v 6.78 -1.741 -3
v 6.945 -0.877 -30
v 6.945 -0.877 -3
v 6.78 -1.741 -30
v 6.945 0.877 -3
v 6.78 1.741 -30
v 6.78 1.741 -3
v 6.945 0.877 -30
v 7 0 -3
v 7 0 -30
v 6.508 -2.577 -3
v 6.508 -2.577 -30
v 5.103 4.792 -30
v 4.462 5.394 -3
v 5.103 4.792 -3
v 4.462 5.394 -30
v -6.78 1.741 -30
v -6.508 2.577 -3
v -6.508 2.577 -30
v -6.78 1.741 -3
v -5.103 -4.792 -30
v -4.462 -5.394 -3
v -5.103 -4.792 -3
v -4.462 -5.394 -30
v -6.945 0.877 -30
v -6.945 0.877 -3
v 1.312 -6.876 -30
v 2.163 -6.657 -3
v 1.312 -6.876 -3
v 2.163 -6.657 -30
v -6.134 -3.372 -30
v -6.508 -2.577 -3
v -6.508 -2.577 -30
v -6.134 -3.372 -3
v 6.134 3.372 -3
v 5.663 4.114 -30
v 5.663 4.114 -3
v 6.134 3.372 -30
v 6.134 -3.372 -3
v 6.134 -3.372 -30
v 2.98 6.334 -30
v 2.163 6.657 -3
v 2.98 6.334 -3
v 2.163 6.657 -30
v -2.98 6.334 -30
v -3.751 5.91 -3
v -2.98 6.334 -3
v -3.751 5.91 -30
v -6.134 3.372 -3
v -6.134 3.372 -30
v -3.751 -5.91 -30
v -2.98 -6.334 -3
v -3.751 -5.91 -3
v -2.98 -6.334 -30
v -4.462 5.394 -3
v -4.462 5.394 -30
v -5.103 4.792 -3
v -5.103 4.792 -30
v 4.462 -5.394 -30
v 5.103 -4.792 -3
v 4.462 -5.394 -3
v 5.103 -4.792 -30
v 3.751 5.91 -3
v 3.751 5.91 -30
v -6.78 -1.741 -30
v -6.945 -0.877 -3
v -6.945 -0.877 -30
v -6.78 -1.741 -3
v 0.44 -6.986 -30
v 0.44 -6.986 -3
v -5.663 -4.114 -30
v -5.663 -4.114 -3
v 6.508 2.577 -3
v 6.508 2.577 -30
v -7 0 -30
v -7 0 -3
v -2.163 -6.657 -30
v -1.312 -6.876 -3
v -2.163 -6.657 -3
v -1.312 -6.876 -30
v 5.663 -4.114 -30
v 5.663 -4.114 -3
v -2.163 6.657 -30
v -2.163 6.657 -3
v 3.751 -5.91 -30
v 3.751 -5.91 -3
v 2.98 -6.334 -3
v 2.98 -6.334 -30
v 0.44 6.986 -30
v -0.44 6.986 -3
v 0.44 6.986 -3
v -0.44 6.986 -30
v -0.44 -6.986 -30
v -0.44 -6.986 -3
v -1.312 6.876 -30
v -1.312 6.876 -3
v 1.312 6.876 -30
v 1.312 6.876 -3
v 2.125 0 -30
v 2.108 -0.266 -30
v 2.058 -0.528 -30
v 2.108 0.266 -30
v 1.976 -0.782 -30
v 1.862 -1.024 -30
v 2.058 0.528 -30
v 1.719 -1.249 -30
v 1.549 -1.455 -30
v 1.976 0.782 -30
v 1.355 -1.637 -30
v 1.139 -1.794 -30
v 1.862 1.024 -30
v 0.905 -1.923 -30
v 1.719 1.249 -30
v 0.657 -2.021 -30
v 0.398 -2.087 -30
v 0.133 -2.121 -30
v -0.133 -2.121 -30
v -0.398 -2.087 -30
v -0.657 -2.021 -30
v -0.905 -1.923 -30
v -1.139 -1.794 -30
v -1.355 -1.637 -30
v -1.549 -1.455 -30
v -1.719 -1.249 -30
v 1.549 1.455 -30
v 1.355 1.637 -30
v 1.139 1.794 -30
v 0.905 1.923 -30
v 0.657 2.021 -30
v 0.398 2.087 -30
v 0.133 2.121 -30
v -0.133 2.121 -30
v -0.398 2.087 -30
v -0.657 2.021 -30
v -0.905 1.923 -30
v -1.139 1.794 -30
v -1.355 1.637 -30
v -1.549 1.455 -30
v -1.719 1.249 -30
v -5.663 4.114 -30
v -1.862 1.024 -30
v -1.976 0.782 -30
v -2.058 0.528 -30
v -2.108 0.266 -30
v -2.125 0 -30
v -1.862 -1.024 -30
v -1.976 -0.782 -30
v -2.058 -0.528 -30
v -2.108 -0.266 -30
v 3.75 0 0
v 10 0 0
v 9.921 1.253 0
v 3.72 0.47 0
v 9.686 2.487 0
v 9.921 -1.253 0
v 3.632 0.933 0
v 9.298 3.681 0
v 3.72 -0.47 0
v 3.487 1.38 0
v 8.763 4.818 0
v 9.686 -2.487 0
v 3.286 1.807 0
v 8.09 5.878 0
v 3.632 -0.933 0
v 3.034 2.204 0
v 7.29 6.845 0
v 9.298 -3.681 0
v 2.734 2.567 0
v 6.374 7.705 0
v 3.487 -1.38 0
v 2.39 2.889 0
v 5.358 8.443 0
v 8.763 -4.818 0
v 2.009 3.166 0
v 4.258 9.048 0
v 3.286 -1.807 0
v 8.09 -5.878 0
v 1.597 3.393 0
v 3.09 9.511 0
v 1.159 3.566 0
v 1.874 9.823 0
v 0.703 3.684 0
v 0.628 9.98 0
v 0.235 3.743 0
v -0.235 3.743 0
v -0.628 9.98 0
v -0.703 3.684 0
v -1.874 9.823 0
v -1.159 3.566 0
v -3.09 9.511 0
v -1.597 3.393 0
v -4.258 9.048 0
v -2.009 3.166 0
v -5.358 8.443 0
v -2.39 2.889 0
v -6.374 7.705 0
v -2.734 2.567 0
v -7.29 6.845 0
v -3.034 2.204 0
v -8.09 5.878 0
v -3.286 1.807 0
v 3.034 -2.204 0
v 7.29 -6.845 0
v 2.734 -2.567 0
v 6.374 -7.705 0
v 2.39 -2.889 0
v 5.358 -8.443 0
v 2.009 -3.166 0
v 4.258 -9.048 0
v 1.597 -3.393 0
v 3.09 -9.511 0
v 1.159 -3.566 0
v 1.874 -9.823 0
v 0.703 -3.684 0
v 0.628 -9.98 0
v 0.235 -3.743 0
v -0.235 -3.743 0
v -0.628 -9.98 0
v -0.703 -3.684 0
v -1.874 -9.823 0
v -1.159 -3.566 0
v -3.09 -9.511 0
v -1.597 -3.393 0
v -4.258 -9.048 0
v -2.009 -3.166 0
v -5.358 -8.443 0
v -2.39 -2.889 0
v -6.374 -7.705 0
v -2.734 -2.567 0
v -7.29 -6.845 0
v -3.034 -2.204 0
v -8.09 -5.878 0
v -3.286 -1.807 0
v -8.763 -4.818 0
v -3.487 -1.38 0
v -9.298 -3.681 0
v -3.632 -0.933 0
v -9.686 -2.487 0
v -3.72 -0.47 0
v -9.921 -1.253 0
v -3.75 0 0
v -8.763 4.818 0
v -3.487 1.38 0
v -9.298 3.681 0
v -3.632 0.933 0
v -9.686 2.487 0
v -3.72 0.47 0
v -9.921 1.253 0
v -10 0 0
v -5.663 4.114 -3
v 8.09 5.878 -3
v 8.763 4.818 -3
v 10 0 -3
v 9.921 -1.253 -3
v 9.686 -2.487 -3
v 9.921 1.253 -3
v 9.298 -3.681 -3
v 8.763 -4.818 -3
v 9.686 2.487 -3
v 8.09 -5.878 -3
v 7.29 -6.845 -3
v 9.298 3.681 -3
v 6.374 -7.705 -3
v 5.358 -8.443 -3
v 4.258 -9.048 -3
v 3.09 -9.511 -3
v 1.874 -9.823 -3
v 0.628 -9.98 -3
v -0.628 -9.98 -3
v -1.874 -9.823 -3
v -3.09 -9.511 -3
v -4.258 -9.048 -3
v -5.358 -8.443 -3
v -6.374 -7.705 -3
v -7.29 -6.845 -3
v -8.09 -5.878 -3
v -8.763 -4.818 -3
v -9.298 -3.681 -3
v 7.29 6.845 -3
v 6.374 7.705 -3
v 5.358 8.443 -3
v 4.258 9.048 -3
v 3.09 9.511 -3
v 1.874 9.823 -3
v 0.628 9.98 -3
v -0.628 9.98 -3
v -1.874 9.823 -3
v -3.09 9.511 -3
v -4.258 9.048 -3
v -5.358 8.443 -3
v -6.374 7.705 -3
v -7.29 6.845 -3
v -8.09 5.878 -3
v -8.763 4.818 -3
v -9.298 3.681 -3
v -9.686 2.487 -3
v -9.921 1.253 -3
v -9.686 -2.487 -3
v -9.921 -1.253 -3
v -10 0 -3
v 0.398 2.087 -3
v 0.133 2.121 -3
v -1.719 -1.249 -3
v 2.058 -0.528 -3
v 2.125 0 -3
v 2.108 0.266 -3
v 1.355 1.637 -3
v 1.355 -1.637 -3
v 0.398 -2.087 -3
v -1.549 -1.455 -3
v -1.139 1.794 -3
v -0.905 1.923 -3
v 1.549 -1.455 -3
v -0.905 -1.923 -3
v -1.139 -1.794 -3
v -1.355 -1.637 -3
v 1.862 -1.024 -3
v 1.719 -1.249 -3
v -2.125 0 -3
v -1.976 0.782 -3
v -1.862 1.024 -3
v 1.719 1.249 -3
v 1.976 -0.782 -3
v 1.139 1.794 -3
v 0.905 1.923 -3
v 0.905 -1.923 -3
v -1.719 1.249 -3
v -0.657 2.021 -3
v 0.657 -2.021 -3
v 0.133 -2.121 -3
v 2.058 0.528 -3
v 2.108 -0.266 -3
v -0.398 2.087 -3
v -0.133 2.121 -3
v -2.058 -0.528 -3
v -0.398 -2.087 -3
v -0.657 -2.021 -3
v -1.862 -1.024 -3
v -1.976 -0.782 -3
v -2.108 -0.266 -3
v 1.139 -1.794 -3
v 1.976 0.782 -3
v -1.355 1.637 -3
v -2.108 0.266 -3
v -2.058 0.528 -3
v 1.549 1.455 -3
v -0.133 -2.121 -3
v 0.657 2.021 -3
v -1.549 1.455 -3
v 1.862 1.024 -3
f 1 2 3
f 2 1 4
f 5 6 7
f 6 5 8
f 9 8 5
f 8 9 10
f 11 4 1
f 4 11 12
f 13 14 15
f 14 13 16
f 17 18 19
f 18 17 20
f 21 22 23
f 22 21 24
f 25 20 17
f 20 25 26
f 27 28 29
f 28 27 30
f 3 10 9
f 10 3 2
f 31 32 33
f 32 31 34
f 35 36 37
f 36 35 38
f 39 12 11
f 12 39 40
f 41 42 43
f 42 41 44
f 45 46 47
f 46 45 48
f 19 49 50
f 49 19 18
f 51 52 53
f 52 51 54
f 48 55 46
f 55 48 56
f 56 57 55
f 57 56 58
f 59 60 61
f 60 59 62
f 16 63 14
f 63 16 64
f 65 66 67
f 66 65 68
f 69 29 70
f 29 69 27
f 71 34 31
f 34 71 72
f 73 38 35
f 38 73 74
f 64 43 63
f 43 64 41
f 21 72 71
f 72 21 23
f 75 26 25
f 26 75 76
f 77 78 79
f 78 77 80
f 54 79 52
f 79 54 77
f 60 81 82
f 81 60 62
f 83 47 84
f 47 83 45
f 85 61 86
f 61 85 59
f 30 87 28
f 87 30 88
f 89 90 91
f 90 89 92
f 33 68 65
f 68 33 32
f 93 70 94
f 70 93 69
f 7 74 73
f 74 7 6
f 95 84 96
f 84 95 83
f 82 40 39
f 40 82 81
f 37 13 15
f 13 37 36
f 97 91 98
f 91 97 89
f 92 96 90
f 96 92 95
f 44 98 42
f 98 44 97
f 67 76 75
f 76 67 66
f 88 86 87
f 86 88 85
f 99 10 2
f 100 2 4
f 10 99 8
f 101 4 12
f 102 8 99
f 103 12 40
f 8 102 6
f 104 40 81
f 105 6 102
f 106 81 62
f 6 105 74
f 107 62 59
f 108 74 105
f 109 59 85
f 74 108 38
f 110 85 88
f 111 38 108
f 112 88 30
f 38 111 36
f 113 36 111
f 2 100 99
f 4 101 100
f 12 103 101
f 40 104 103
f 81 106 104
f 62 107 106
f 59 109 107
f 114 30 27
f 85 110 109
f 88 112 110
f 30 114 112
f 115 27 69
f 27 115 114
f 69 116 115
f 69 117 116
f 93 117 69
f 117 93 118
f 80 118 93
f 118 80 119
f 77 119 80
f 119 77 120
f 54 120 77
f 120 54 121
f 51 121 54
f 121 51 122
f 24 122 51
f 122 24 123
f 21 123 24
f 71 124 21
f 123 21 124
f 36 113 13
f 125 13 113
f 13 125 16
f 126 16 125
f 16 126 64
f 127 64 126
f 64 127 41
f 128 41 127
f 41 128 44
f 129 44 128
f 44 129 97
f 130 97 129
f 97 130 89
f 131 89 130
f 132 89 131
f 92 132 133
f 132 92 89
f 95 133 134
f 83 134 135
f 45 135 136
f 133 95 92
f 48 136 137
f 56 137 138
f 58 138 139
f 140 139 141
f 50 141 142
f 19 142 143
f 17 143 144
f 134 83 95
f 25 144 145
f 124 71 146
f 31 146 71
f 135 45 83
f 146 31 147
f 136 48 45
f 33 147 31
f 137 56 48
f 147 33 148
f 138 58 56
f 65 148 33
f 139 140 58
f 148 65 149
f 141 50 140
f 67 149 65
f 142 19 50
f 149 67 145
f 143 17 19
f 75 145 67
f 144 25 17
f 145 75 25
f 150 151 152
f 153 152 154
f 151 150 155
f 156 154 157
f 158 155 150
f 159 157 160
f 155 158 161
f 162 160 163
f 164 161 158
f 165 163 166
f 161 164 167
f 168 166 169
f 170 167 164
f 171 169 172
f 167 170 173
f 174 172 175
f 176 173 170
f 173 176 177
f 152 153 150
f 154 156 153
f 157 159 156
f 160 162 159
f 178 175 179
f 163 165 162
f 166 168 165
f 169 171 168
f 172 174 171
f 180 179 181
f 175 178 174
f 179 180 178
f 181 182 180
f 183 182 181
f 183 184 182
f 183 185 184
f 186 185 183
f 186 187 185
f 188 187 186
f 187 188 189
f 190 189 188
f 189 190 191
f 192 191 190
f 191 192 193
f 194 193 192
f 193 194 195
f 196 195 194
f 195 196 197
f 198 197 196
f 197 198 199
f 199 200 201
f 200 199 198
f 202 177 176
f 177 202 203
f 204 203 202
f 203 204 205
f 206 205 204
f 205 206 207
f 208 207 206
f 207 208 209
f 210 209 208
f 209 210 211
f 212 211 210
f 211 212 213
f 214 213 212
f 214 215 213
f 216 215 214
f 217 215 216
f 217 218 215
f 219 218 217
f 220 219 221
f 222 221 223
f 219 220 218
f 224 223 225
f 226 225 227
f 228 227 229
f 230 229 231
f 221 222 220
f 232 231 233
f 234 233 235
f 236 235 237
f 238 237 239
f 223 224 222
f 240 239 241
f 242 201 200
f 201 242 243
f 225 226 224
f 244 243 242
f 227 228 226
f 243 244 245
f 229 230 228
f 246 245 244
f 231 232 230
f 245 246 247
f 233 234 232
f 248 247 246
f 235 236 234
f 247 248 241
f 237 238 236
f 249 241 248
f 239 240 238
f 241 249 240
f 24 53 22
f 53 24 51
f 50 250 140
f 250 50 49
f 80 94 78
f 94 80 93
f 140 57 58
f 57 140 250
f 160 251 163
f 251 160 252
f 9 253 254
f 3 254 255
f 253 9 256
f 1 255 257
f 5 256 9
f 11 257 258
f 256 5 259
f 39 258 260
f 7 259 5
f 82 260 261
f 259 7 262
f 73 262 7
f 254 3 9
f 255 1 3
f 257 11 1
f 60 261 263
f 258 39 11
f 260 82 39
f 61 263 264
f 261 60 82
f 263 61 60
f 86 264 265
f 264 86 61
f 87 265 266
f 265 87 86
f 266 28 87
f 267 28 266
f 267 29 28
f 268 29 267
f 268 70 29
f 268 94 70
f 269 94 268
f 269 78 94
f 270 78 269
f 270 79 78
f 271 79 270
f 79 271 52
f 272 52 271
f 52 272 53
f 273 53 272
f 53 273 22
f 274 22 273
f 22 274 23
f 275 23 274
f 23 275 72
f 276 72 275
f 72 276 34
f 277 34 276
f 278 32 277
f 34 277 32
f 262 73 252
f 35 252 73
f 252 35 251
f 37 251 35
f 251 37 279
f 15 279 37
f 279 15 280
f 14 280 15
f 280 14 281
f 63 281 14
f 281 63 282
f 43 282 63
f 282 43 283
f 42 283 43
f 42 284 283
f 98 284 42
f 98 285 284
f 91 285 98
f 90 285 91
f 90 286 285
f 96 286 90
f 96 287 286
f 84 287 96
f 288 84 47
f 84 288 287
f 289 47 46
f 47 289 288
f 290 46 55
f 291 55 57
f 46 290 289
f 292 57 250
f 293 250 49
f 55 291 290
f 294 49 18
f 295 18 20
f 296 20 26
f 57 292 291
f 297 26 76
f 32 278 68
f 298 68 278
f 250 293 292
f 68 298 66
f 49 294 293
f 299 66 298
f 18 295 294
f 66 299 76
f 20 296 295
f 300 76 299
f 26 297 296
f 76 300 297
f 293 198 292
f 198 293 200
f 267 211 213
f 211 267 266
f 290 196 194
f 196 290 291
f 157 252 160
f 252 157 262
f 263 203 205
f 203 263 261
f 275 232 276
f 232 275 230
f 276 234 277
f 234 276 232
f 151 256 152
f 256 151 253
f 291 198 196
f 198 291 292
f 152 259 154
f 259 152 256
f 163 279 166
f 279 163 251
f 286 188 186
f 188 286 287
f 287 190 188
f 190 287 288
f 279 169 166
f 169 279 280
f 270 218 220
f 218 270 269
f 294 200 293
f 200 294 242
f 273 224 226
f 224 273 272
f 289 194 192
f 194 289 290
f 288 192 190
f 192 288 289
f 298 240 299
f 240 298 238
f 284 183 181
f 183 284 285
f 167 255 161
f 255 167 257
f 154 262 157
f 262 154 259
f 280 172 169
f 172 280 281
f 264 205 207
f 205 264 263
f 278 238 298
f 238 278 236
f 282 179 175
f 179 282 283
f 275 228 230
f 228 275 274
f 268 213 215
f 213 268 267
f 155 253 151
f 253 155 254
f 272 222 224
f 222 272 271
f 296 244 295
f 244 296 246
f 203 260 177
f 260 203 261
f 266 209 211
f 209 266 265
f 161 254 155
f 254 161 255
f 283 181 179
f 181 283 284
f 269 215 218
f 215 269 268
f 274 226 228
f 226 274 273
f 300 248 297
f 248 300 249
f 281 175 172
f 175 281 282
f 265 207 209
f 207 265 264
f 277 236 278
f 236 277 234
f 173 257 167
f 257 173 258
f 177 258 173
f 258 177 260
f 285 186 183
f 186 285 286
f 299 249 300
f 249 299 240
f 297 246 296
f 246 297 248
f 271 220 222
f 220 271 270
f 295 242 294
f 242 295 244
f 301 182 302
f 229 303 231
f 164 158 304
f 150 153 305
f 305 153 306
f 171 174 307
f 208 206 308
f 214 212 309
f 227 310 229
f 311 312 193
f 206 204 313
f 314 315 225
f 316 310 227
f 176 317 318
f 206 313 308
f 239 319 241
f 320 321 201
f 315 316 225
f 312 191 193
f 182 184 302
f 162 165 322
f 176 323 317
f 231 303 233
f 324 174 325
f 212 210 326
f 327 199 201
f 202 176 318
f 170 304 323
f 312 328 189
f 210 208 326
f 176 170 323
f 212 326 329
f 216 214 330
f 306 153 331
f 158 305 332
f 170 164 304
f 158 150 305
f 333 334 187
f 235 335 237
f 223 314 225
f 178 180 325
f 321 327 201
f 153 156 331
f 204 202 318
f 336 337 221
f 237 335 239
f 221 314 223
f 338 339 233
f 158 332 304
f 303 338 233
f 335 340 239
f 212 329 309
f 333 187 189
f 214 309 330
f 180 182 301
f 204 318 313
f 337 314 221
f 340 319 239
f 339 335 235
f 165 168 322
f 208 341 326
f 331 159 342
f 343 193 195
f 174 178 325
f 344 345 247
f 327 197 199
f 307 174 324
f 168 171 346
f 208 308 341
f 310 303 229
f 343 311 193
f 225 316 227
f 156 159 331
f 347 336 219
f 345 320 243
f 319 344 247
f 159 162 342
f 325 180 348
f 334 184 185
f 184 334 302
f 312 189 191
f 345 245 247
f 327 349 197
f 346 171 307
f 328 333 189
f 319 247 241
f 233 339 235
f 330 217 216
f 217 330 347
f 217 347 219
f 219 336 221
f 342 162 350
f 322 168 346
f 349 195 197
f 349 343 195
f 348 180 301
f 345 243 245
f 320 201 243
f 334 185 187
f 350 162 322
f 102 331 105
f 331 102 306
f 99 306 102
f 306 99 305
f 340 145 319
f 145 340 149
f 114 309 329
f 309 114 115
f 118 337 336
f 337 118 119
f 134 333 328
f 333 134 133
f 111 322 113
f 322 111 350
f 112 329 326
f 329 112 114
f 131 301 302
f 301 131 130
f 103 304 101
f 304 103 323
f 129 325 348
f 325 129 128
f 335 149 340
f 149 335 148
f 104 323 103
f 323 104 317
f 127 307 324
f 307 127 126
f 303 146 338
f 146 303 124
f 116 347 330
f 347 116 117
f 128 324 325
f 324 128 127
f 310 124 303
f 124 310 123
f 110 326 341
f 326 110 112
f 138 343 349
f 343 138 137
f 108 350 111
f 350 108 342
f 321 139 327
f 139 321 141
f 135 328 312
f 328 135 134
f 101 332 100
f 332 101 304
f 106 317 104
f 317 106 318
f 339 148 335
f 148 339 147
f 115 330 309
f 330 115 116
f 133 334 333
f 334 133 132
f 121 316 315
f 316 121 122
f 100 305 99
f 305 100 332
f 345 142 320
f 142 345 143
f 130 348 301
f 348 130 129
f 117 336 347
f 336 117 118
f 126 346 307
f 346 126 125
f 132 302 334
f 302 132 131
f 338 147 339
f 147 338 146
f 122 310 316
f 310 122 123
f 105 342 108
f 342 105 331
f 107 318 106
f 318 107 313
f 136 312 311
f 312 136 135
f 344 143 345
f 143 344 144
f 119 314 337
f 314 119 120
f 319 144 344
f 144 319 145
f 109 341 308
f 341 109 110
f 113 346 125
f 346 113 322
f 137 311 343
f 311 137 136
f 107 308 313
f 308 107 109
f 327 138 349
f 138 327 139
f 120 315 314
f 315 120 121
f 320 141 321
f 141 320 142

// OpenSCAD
$fn = 50;


difference() {
	union() {
		translate(v = [0, 0, -30.0000000000]) {
			cylinder(h = 30, r = 7.0000000000);
		}
		translate(v = [0, 0, -3.0000000000]) {
			cylinder(h = 3, r = 10.0000000000);
		}
	}
	union() {
		translate(v = [0, 0, 0]) {
			rotate(a = [0, 0, 0]) {
				difference() {
					union() {
						#translate(v = [0, 0, -30.0000000000]) {
							cylinder(h = 30, r = 2.0000000000);
						}
						#translate(v = [0, 0, -3]) {
							cylinder(h = 3, r = 7.0000000000, r1 = 2.1250000000, r2 = 3.7500000000);
						}
						#translate(v = [0, 0, -30.0000000000]) {
							cylinder(h = 30, r = 2.1250000000);
						}
						#translate(v = [0, 0, -30.0000000000]) {
							cylinder(h = 30, r = 2.0000000000);
						}
					}
					union();
				}
			}
		}
	}
}
